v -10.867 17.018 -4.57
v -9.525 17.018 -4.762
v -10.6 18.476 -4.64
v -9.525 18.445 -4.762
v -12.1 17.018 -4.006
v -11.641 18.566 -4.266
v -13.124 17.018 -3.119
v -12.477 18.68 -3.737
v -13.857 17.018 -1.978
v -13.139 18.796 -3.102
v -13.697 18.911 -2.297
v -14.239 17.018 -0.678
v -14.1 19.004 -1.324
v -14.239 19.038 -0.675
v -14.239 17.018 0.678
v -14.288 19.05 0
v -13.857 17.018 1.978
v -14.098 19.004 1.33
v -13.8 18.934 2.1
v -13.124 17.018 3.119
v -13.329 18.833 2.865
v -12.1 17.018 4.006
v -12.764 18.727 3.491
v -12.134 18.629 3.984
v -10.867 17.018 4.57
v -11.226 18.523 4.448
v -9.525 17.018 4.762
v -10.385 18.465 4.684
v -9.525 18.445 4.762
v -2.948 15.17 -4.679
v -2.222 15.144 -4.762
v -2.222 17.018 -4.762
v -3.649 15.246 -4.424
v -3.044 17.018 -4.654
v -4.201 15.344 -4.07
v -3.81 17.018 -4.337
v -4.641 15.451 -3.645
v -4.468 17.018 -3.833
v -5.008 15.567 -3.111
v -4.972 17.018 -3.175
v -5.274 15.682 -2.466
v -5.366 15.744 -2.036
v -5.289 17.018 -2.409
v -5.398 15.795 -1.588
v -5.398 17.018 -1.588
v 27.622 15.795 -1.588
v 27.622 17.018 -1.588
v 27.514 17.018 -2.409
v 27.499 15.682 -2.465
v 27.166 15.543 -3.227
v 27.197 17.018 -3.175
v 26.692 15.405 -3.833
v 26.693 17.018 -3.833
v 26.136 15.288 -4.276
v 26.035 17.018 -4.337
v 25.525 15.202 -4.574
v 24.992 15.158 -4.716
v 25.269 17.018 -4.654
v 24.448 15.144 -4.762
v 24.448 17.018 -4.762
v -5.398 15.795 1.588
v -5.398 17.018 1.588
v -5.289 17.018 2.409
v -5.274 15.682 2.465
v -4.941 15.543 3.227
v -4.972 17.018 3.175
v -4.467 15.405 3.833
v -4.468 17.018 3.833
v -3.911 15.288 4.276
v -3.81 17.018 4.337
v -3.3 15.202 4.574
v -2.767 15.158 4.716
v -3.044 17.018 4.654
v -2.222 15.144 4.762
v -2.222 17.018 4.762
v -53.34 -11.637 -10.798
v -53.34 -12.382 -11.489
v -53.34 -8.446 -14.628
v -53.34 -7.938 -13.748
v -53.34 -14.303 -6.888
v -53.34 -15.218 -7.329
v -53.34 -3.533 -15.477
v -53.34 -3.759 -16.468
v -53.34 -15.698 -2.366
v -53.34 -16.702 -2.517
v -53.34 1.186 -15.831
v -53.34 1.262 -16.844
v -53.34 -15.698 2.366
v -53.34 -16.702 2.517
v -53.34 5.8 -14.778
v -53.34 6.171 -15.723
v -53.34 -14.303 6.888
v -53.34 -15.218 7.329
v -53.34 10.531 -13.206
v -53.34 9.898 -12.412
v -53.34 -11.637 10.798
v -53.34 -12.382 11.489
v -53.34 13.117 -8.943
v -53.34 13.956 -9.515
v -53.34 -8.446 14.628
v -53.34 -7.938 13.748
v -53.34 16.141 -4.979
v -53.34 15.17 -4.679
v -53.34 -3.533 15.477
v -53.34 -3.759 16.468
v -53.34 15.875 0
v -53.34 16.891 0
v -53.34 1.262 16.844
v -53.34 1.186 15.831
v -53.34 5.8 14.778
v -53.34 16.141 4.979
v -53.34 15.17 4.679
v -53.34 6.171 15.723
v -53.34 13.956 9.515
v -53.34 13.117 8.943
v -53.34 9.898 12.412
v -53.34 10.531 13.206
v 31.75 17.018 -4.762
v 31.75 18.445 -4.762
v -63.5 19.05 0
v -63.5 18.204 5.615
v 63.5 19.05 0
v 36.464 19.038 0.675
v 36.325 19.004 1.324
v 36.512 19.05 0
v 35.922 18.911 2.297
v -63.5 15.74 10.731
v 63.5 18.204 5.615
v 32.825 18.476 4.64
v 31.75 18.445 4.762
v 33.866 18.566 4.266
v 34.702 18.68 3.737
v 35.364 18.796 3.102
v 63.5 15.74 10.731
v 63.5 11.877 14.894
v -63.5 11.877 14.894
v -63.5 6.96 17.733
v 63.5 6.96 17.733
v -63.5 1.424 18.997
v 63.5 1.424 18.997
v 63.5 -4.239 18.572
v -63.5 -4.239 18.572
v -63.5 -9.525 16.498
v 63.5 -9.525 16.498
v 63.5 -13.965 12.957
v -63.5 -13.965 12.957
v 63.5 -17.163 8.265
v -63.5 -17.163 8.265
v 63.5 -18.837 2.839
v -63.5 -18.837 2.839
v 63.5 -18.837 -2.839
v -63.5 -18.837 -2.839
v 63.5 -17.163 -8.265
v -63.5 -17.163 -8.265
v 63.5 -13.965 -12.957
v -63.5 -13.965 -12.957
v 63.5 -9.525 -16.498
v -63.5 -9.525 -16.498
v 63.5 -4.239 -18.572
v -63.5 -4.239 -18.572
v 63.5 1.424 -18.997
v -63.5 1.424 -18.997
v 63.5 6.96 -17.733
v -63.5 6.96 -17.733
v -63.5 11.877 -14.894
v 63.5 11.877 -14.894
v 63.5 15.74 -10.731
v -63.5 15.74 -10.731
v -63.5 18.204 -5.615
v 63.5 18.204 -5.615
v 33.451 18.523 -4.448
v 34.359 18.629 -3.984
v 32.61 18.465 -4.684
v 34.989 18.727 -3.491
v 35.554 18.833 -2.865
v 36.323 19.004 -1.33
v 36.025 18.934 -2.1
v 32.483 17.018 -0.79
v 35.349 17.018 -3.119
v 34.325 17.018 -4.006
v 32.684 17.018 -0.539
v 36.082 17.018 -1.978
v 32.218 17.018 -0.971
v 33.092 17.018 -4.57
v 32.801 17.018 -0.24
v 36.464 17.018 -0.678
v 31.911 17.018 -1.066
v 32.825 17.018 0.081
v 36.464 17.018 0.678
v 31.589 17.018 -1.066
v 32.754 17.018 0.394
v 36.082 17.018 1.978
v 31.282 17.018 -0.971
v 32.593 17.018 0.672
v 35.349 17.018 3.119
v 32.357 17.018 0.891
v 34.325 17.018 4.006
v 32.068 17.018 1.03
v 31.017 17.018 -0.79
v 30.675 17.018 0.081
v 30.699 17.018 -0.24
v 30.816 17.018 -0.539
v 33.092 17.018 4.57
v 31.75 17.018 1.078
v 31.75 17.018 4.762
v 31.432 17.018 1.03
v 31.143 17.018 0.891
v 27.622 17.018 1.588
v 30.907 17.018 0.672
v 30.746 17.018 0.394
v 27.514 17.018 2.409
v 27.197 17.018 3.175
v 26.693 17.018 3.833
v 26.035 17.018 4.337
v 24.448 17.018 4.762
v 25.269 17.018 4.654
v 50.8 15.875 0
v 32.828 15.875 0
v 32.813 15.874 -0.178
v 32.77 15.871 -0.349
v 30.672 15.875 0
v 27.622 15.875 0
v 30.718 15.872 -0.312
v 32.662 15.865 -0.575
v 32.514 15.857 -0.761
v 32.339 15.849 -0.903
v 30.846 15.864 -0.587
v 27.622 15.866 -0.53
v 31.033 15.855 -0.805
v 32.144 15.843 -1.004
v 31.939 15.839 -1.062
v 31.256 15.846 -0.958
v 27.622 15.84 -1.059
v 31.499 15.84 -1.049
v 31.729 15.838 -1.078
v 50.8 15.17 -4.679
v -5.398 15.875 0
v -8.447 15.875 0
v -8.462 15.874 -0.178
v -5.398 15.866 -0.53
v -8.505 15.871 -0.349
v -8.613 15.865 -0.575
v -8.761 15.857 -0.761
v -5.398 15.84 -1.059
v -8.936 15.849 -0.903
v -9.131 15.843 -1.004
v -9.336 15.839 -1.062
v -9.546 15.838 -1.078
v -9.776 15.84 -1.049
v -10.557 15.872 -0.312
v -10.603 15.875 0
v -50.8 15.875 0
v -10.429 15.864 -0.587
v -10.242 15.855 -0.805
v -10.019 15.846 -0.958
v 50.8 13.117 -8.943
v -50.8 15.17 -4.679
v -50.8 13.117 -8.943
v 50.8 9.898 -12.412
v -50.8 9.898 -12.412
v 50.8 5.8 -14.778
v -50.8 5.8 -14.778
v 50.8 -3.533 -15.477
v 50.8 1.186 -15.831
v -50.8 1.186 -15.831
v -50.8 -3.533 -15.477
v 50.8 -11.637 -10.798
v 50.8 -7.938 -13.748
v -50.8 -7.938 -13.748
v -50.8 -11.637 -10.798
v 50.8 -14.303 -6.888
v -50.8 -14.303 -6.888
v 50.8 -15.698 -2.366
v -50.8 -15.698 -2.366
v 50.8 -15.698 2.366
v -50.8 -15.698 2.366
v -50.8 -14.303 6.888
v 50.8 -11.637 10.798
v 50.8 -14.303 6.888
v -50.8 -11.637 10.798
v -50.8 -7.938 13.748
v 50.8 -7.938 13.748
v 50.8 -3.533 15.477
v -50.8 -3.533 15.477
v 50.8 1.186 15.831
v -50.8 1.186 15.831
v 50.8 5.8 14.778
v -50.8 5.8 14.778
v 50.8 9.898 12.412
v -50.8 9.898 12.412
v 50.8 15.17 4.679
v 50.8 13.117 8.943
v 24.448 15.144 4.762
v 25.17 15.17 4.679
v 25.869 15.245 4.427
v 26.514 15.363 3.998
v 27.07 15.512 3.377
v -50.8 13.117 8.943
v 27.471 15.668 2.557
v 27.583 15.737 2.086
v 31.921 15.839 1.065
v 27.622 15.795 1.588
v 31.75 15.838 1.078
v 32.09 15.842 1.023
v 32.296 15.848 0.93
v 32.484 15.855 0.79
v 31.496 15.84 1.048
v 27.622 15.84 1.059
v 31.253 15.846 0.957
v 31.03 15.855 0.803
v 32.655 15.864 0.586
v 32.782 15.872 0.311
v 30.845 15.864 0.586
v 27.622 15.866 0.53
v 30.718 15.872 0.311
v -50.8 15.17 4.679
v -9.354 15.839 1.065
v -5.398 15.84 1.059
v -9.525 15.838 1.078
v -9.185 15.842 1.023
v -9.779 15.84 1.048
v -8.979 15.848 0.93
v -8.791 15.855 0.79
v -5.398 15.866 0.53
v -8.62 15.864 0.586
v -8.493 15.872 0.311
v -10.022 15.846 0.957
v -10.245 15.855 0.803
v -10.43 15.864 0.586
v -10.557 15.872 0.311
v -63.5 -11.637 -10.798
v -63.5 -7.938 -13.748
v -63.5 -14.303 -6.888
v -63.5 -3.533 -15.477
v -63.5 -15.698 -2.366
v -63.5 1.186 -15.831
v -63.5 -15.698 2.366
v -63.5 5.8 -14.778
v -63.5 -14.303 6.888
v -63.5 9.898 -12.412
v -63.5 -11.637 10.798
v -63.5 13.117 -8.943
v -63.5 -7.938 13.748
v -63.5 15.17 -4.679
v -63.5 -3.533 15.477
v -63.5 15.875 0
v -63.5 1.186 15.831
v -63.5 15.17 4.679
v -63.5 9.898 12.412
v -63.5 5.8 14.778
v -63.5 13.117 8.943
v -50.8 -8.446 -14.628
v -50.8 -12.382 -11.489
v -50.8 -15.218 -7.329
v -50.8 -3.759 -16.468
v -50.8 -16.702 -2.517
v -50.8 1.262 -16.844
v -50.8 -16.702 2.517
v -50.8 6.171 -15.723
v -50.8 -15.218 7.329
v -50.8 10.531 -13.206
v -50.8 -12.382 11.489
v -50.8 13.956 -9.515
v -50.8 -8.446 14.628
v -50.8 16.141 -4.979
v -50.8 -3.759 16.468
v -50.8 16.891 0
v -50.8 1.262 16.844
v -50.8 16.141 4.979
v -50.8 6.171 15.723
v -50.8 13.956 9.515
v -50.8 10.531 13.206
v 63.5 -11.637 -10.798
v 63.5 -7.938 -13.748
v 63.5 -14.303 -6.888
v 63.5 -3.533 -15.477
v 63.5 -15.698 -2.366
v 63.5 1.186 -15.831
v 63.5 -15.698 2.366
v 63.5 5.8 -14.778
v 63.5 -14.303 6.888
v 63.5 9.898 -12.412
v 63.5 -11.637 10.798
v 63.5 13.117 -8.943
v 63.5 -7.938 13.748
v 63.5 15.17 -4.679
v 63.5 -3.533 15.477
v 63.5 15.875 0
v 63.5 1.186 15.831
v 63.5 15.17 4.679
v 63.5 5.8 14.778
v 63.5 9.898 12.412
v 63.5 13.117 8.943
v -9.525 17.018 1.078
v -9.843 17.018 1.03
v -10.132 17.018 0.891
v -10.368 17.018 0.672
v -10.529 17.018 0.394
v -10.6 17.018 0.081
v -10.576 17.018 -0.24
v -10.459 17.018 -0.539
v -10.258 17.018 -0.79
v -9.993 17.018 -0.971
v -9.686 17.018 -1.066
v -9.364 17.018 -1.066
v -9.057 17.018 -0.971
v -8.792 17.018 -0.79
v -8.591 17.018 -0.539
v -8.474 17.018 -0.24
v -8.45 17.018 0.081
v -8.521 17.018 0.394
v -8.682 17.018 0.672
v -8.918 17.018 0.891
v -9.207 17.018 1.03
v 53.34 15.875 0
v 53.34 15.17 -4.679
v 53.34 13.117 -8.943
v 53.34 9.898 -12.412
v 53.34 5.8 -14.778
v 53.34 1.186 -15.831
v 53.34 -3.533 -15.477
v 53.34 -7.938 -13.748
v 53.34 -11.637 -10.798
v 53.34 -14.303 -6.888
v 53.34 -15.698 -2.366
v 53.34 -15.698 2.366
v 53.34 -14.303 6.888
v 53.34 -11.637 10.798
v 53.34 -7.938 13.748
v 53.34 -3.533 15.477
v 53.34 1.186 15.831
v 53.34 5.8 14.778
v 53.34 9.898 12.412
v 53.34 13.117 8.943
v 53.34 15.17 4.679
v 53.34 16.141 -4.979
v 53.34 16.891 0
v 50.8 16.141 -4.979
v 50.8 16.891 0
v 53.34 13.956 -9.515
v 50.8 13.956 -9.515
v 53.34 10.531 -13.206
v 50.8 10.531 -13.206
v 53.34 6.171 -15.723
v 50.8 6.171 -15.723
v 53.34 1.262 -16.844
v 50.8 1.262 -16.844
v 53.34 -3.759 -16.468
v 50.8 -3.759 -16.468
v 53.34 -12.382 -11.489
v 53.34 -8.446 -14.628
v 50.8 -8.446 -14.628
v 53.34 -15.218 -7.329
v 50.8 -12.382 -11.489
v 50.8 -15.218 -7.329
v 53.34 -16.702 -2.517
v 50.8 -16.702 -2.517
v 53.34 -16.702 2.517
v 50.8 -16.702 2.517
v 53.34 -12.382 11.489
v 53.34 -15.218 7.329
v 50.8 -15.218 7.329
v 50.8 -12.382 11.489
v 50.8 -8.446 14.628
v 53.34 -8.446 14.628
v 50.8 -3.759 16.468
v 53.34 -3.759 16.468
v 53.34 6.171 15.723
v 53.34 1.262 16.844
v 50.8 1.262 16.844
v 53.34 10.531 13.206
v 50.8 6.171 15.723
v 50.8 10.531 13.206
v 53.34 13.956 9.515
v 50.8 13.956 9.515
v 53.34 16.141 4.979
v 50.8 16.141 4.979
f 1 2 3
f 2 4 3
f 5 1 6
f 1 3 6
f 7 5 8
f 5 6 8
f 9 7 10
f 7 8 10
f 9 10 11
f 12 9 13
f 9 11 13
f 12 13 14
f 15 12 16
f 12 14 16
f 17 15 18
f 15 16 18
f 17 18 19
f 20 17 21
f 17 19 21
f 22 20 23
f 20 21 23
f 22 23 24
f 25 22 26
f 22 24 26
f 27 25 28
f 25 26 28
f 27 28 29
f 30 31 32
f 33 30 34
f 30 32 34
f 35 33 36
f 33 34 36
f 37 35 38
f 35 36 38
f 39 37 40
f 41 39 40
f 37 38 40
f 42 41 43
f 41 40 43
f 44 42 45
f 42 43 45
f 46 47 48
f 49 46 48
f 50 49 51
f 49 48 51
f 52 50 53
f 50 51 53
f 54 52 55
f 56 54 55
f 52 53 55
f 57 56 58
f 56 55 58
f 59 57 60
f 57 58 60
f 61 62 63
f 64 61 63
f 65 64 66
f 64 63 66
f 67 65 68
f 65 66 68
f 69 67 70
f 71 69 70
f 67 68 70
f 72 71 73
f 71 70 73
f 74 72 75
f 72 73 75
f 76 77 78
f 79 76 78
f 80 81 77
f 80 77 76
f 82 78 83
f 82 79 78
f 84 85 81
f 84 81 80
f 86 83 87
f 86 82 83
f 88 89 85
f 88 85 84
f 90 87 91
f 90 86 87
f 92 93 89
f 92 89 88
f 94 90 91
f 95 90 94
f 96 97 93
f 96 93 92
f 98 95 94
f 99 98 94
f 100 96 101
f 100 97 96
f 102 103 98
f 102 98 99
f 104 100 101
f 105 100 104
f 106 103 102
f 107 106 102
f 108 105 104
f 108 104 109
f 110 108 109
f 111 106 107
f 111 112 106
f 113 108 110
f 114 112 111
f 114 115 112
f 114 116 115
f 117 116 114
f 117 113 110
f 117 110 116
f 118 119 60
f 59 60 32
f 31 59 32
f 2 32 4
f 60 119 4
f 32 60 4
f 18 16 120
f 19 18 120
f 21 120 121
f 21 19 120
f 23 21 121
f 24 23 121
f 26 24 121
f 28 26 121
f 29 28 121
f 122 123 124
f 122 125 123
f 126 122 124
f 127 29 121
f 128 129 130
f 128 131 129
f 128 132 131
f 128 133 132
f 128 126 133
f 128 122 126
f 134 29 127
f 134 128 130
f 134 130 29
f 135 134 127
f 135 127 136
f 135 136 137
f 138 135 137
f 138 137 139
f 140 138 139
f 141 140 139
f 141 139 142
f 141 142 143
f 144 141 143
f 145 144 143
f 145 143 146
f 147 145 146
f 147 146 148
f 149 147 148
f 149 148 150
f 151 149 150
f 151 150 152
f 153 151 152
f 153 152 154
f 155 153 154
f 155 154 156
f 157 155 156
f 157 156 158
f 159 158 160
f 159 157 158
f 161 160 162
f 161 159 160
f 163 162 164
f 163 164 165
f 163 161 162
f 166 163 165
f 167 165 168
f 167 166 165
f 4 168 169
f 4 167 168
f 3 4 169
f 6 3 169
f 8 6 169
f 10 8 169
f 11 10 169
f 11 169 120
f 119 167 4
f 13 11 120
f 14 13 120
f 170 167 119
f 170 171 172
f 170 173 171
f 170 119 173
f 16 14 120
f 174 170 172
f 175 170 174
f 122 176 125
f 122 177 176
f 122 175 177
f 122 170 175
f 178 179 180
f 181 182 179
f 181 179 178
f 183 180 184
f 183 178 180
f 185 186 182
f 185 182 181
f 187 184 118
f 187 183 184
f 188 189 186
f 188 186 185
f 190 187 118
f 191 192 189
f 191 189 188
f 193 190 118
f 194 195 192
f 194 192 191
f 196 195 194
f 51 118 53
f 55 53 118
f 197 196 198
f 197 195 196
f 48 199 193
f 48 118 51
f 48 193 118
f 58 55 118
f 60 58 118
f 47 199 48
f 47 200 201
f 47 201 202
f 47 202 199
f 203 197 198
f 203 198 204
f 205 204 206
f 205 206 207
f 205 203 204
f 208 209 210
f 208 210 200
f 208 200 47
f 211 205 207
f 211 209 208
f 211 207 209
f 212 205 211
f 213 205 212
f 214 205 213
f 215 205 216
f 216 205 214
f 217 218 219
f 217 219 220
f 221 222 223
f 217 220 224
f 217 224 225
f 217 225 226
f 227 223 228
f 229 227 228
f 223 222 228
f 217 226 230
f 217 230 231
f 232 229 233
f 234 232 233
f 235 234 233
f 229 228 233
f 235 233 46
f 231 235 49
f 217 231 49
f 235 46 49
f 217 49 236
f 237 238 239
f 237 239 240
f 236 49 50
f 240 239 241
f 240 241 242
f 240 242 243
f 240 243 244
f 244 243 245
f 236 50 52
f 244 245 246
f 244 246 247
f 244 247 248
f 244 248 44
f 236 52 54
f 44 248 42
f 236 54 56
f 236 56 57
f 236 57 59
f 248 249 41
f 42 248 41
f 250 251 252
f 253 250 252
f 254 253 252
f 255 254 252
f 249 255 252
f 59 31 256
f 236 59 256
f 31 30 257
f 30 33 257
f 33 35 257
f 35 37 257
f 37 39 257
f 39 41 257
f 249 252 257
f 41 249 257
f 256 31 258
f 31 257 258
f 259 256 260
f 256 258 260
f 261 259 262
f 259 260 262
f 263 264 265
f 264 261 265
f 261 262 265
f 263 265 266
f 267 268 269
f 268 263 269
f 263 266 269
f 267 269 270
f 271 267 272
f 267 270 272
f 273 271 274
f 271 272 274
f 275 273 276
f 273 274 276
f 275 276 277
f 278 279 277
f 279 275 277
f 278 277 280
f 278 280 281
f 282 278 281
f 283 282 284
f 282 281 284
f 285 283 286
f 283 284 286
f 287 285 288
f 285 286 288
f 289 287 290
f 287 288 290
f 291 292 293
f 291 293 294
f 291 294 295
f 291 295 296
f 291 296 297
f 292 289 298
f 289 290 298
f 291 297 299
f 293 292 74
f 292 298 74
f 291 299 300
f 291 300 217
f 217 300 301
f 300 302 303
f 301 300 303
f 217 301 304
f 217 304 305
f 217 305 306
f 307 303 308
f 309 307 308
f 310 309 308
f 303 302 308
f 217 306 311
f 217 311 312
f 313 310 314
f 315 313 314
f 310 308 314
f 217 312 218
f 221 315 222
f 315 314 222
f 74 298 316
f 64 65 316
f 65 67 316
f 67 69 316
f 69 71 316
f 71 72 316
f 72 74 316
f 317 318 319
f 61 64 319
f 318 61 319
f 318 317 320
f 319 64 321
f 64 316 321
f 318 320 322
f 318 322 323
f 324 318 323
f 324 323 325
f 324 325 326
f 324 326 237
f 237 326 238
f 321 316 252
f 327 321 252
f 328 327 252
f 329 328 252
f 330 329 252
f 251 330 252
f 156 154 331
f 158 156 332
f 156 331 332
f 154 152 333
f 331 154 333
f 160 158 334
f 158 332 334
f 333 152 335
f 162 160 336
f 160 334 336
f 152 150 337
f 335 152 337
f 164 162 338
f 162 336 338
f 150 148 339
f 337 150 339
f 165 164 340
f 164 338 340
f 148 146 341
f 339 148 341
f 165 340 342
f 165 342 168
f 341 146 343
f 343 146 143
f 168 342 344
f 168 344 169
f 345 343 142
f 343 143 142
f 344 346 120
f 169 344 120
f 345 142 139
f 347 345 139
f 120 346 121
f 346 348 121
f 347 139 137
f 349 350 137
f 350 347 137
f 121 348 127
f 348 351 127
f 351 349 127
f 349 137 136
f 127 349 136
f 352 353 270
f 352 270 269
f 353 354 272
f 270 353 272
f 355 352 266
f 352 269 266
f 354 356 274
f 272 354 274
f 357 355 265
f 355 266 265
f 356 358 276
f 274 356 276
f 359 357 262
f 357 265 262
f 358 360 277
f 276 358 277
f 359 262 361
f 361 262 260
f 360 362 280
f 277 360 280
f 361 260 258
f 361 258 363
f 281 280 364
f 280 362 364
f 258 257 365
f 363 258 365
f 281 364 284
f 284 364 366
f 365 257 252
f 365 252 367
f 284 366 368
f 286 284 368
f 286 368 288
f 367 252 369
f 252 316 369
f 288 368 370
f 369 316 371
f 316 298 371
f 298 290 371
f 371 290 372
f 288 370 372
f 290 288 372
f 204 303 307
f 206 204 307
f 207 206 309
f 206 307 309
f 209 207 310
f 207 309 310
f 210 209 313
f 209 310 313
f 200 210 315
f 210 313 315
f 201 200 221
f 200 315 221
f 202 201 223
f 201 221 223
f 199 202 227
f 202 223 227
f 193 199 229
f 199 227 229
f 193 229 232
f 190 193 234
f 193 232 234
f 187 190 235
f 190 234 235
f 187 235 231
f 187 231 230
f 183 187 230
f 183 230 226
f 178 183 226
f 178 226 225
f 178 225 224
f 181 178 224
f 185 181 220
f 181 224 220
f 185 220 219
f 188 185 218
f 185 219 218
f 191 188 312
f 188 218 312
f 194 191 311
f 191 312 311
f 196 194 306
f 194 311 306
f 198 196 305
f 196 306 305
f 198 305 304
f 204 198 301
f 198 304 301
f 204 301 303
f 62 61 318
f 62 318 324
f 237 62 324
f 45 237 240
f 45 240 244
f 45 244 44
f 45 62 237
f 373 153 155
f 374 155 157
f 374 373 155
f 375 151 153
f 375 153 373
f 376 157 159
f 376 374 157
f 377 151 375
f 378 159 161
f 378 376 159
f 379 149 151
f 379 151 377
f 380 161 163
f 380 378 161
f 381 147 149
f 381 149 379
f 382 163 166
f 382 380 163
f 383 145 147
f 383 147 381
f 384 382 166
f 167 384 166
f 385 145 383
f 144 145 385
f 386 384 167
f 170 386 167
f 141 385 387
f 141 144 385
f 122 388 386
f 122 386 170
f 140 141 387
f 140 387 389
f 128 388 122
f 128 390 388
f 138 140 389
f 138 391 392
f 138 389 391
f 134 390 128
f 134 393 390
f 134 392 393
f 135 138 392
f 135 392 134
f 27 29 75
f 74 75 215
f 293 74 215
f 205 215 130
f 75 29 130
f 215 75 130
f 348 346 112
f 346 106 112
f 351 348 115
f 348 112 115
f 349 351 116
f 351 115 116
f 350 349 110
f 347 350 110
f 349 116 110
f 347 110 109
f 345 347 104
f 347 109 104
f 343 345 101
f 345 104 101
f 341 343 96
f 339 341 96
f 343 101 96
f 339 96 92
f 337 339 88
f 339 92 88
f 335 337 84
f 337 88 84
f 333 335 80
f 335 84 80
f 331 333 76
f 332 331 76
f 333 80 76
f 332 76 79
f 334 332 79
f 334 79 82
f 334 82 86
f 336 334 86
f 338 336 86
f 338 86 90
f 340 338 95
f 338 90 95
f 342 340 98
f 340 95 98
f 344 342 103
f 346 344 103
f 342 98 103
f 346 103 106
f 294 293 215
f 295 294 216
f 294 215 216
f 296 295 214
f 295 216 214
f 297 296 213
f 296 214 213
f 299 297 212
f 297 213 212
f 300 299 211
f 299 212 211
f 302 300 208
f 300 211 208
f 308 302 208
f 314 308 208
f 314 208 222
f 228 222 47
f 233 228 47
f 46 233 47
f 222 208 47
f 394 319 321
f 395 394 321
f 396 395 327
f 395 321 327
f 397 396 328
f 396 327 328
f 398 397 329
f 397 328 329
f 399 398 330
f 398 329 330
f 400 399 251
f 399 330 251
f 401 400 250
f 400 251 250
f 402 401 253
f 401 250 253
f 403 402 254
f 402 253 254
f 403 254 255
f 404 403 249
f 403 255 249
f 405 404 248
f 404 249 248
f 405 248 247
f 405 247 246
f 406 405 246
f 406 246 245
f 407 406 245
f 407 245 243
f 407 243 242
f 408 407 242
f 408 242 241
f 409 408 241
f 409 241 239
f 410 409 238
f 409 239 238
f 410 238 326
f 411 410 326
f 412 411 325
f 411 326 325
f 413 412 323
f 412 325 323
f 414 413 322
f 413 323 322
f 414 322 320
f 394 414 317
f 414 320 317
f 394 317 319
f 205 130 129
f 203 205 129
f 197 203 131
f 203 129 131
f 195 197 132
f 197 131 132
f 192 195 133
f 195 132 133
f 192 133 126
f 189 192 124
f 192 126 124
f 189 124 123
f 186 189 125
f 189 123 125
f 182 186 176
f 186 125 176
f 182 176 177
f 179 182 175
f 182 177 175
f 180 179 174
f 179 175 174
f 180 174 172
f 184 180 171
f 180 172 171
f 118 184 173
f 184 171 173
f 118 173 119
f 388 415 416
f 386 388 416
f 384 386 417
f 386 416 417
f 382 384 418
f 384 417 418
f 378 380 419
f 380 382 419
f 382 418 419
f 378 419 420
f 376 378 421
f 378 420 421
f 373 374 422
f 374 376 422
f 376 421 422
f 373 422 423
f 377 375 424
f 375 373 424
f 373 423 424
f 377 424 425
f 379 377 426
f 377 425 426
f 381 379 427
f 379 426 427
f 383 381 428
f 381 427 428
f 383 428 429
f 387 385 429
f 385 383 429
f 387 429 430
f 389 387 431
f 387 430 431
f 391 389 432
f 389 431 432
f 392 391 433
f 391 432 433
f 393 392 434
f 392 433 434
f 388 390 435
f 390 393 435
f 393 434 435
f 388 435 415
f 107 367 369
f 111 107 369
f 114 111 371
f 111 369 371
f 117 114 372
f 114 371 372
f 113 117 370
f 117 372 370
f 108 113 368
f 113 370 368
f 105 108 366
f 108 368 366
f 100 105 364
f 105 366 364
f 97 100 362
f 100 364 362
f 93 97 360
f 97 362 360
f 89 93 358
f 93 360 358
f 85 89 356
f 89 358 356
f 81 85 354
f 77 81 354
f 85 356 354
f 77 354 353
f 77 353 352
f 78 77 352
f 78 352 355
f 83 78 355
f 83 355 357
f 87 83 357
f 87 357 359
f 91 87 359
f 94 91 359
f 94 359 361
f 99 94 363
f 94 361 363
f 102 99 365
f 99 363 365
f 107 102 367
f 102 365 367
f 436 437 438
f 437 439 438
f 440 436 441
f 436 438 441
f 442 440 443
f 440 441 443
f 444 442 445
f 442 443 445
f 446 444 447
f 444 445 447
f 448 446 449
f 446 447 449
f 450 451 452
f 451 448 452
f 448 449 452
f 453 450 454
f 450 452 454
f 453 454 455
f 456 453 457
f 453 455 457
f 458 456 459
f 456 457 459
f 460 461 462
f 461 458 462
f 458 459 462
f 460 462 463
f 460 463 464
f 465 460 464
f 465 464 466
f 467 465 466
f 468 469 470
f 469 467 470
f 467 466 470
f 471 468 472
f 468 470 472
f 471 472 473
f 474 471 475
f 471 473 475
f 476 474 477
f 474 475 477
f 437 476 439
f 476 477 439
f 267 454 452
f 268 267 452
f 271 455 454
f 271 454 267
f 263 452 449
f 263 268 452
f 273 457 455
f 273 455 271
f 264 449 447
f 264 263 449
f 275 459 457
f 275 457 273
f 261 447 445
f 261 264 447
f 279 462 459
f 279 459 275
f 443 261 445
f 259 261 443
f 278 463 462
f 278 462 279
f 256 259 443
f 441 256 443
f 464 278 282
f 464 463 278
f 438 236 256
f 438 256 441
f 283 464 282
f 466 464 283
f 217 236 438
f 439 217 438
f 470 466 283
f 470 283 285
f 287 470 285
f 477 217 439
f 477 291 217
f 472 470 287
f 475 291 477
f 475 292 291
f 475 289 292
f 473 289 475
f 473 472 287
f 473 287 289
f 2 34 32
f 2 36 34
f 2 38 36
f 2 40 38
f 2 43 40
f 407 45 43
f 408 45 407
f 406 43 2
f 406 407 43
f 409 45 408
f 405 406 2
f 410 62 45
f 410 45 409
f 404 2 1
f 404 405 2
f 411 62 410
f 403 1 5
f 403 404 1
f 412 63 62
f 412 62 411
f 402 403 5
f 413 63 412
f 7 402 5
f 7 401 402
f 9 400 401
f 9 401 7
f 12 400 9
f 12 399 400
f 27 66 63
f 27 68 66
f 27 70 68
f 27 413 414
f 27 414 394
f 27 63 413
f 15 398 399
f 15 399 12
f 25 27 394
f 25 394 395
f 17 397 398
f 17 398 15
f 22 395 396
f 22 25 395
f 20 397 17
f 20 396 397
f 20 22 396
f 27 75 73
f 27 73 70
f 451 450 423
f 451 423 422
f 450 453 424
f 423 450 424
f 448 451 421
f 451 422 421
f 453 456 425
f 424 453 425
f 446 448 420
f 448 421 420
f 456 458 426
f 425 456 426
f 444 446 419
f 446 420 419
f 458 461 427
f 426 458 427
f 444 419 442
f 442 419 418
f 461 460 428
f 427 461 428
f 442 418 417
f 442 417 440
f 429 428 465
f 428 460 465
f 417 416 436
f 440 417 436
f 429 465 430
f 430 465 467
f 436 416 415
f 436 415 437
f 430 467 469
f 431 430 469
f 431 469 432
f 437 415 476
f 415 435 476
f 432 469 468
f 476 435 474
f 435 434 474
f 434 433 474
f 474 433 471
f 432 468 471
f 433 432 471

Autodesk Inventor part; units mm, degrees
ref_plane "YZ Plane" through (0, 0, 0) normal (1, 0, 0) x (0, 1, 0)
ref_plane "XY Plane" through (0, 0, 0) normal (0, 0, 1) x (1, 0, 0)
sketch "Sketch1" plane through (0, 0, 0) normal (0, 0, 1) x (1, 0, 0)
  line L0 (-106.628, 0) -> (106.628, 0) construction
  line L1 (-63.5, 19.05) -> (63.5, 19.05)
  line L2 (63.5, 19.05) -> (63.5, 15.875)
  line L3 (-63.5, 15.875) -> (-63.5, 19.05)
  line L4 (-63.5, 15.875) -> (-53.34, 15.875)
  line L5 (-53.34, 15.875) -> (-53.34, 16.891)
  line L6 (-53.34, 16.891) -> (-50.8, 16.891)
  line L7 (-50.8, 16.891) -> (-50.8, 15.875)
  line L8 (-50.8, 15.875) -> (0, 15.875)
  line L9 (0, 0) -> (0, 19.05) construction
  line L10 (63.5, 15.875) -> (53.34, 15.875)
  line L11 (53.34, 15.875) -> (53.34, 16.891)
  line L12 (53.34, 16.891) -> (50.8, 16.891)
  line L13 (50.8, 16.891) -> (50.8, 15.875)
  line L14 (50.8, 15.875) -> (0, 15.875)
  dimension "d0" = 127
  dimension "d1" = 38.1
  dimension "d2" = 31.75
  dimension "d3" = 10.16
  dimension "d4" = 2.54
  dimension "d5" = 1.016
revolve "Revolution1" add sketch "Sketch1" angle 360 about axis through (-106.628, 0, 0) along (1, 0, 0)
ref_plane "Work Plane1" through (0, 19.05, 0) normal (0, 1, 0) x (-1, 0, 0)
sketch "Sketch2" plane through (0, 19.05, 0) normal (0, 1, 0) x (-1, 0, 0)
  line L0 (-31.75, 0) -> (9.525, 0) construction
  line L1 (-31.75, -4.7625) -> (9.525, -4.7625)
  line L2 (9.525, 4.7625) -> (-31.75, 4.7625)
  arc A0 (-31.75, 4.7625) -> (-31.75, -4.7625) centre (-31.75, 0) ccw
  arc A1 (9.525, -4.7625) -> (9.525, 4.7625) centre (9.525, 0) ccw
  line L3 (-63.5, 19.05) -> (-63.5, -19.05) projected
  line L4 (-27.6225, 1.5875) -> (-27.6225, -1.5875)
  line L5 (5.3975, 1.5875) -> (5.3975, -1.5875)
  arc A2 (5.3975, 1.5875) -> (2.2225, 4.7625) centre (2.2225, 1.5875) ccw
  arc A3 (2.2225, -4.7625) -> (5.3975, -1.5875) centre (2.2225, -1.5875) ccw
  arc A4 (-24.4475, 4.7625) -> (-27.6225, 1.5875) centre (-24.4475, 1.5875) ccw
  arc A5 (-27.6225, -1.5875) -> (-24.4475, -4.7625) centre (-24.4475, -1.5875) ccw
  point P0 (0, 0)
  point P1 (-11.1125, 0)
  point P2 (-36.5125, 0)
  point P3 (9.525, 0)
  point P4 (-63.5, 0)
  dimension "d7" = 9.525
  dimension "d8" = 41.275
  dimension "d10" = 33.02
  dimension "d11" = 16.51
  dimension "d12" = 3.175
  dimension "d13" = 3.175
  dimension "d27" = 31.75
extrude "Extrusion1" cut sketch "Sketch2" against normal blind 2.032
extrude "Extrusion2" cut sketch "Sketch2" against normal up to surface contours A5 L4 A4 L2 A2 L5 A3 L1
hole "Hole1" at (-9.525, 19.05, 0) at (31.75, 19.05, 0) direction (0, -1, 0) diameter 2.1565 depth 6.35 tip angle 118 thread size "4-40 UNC" class "2B" standard "ANSI Unified Screw Threads"
thread "Thread1" size "1 1/4-18 UNEF" class "2B" standard "ANSI Unified Screw Threads" full length
equation "\"d11\" = 0.5 * d10"
properties part number "InventorNativeNewHilt" material "Aluminum 6061"
